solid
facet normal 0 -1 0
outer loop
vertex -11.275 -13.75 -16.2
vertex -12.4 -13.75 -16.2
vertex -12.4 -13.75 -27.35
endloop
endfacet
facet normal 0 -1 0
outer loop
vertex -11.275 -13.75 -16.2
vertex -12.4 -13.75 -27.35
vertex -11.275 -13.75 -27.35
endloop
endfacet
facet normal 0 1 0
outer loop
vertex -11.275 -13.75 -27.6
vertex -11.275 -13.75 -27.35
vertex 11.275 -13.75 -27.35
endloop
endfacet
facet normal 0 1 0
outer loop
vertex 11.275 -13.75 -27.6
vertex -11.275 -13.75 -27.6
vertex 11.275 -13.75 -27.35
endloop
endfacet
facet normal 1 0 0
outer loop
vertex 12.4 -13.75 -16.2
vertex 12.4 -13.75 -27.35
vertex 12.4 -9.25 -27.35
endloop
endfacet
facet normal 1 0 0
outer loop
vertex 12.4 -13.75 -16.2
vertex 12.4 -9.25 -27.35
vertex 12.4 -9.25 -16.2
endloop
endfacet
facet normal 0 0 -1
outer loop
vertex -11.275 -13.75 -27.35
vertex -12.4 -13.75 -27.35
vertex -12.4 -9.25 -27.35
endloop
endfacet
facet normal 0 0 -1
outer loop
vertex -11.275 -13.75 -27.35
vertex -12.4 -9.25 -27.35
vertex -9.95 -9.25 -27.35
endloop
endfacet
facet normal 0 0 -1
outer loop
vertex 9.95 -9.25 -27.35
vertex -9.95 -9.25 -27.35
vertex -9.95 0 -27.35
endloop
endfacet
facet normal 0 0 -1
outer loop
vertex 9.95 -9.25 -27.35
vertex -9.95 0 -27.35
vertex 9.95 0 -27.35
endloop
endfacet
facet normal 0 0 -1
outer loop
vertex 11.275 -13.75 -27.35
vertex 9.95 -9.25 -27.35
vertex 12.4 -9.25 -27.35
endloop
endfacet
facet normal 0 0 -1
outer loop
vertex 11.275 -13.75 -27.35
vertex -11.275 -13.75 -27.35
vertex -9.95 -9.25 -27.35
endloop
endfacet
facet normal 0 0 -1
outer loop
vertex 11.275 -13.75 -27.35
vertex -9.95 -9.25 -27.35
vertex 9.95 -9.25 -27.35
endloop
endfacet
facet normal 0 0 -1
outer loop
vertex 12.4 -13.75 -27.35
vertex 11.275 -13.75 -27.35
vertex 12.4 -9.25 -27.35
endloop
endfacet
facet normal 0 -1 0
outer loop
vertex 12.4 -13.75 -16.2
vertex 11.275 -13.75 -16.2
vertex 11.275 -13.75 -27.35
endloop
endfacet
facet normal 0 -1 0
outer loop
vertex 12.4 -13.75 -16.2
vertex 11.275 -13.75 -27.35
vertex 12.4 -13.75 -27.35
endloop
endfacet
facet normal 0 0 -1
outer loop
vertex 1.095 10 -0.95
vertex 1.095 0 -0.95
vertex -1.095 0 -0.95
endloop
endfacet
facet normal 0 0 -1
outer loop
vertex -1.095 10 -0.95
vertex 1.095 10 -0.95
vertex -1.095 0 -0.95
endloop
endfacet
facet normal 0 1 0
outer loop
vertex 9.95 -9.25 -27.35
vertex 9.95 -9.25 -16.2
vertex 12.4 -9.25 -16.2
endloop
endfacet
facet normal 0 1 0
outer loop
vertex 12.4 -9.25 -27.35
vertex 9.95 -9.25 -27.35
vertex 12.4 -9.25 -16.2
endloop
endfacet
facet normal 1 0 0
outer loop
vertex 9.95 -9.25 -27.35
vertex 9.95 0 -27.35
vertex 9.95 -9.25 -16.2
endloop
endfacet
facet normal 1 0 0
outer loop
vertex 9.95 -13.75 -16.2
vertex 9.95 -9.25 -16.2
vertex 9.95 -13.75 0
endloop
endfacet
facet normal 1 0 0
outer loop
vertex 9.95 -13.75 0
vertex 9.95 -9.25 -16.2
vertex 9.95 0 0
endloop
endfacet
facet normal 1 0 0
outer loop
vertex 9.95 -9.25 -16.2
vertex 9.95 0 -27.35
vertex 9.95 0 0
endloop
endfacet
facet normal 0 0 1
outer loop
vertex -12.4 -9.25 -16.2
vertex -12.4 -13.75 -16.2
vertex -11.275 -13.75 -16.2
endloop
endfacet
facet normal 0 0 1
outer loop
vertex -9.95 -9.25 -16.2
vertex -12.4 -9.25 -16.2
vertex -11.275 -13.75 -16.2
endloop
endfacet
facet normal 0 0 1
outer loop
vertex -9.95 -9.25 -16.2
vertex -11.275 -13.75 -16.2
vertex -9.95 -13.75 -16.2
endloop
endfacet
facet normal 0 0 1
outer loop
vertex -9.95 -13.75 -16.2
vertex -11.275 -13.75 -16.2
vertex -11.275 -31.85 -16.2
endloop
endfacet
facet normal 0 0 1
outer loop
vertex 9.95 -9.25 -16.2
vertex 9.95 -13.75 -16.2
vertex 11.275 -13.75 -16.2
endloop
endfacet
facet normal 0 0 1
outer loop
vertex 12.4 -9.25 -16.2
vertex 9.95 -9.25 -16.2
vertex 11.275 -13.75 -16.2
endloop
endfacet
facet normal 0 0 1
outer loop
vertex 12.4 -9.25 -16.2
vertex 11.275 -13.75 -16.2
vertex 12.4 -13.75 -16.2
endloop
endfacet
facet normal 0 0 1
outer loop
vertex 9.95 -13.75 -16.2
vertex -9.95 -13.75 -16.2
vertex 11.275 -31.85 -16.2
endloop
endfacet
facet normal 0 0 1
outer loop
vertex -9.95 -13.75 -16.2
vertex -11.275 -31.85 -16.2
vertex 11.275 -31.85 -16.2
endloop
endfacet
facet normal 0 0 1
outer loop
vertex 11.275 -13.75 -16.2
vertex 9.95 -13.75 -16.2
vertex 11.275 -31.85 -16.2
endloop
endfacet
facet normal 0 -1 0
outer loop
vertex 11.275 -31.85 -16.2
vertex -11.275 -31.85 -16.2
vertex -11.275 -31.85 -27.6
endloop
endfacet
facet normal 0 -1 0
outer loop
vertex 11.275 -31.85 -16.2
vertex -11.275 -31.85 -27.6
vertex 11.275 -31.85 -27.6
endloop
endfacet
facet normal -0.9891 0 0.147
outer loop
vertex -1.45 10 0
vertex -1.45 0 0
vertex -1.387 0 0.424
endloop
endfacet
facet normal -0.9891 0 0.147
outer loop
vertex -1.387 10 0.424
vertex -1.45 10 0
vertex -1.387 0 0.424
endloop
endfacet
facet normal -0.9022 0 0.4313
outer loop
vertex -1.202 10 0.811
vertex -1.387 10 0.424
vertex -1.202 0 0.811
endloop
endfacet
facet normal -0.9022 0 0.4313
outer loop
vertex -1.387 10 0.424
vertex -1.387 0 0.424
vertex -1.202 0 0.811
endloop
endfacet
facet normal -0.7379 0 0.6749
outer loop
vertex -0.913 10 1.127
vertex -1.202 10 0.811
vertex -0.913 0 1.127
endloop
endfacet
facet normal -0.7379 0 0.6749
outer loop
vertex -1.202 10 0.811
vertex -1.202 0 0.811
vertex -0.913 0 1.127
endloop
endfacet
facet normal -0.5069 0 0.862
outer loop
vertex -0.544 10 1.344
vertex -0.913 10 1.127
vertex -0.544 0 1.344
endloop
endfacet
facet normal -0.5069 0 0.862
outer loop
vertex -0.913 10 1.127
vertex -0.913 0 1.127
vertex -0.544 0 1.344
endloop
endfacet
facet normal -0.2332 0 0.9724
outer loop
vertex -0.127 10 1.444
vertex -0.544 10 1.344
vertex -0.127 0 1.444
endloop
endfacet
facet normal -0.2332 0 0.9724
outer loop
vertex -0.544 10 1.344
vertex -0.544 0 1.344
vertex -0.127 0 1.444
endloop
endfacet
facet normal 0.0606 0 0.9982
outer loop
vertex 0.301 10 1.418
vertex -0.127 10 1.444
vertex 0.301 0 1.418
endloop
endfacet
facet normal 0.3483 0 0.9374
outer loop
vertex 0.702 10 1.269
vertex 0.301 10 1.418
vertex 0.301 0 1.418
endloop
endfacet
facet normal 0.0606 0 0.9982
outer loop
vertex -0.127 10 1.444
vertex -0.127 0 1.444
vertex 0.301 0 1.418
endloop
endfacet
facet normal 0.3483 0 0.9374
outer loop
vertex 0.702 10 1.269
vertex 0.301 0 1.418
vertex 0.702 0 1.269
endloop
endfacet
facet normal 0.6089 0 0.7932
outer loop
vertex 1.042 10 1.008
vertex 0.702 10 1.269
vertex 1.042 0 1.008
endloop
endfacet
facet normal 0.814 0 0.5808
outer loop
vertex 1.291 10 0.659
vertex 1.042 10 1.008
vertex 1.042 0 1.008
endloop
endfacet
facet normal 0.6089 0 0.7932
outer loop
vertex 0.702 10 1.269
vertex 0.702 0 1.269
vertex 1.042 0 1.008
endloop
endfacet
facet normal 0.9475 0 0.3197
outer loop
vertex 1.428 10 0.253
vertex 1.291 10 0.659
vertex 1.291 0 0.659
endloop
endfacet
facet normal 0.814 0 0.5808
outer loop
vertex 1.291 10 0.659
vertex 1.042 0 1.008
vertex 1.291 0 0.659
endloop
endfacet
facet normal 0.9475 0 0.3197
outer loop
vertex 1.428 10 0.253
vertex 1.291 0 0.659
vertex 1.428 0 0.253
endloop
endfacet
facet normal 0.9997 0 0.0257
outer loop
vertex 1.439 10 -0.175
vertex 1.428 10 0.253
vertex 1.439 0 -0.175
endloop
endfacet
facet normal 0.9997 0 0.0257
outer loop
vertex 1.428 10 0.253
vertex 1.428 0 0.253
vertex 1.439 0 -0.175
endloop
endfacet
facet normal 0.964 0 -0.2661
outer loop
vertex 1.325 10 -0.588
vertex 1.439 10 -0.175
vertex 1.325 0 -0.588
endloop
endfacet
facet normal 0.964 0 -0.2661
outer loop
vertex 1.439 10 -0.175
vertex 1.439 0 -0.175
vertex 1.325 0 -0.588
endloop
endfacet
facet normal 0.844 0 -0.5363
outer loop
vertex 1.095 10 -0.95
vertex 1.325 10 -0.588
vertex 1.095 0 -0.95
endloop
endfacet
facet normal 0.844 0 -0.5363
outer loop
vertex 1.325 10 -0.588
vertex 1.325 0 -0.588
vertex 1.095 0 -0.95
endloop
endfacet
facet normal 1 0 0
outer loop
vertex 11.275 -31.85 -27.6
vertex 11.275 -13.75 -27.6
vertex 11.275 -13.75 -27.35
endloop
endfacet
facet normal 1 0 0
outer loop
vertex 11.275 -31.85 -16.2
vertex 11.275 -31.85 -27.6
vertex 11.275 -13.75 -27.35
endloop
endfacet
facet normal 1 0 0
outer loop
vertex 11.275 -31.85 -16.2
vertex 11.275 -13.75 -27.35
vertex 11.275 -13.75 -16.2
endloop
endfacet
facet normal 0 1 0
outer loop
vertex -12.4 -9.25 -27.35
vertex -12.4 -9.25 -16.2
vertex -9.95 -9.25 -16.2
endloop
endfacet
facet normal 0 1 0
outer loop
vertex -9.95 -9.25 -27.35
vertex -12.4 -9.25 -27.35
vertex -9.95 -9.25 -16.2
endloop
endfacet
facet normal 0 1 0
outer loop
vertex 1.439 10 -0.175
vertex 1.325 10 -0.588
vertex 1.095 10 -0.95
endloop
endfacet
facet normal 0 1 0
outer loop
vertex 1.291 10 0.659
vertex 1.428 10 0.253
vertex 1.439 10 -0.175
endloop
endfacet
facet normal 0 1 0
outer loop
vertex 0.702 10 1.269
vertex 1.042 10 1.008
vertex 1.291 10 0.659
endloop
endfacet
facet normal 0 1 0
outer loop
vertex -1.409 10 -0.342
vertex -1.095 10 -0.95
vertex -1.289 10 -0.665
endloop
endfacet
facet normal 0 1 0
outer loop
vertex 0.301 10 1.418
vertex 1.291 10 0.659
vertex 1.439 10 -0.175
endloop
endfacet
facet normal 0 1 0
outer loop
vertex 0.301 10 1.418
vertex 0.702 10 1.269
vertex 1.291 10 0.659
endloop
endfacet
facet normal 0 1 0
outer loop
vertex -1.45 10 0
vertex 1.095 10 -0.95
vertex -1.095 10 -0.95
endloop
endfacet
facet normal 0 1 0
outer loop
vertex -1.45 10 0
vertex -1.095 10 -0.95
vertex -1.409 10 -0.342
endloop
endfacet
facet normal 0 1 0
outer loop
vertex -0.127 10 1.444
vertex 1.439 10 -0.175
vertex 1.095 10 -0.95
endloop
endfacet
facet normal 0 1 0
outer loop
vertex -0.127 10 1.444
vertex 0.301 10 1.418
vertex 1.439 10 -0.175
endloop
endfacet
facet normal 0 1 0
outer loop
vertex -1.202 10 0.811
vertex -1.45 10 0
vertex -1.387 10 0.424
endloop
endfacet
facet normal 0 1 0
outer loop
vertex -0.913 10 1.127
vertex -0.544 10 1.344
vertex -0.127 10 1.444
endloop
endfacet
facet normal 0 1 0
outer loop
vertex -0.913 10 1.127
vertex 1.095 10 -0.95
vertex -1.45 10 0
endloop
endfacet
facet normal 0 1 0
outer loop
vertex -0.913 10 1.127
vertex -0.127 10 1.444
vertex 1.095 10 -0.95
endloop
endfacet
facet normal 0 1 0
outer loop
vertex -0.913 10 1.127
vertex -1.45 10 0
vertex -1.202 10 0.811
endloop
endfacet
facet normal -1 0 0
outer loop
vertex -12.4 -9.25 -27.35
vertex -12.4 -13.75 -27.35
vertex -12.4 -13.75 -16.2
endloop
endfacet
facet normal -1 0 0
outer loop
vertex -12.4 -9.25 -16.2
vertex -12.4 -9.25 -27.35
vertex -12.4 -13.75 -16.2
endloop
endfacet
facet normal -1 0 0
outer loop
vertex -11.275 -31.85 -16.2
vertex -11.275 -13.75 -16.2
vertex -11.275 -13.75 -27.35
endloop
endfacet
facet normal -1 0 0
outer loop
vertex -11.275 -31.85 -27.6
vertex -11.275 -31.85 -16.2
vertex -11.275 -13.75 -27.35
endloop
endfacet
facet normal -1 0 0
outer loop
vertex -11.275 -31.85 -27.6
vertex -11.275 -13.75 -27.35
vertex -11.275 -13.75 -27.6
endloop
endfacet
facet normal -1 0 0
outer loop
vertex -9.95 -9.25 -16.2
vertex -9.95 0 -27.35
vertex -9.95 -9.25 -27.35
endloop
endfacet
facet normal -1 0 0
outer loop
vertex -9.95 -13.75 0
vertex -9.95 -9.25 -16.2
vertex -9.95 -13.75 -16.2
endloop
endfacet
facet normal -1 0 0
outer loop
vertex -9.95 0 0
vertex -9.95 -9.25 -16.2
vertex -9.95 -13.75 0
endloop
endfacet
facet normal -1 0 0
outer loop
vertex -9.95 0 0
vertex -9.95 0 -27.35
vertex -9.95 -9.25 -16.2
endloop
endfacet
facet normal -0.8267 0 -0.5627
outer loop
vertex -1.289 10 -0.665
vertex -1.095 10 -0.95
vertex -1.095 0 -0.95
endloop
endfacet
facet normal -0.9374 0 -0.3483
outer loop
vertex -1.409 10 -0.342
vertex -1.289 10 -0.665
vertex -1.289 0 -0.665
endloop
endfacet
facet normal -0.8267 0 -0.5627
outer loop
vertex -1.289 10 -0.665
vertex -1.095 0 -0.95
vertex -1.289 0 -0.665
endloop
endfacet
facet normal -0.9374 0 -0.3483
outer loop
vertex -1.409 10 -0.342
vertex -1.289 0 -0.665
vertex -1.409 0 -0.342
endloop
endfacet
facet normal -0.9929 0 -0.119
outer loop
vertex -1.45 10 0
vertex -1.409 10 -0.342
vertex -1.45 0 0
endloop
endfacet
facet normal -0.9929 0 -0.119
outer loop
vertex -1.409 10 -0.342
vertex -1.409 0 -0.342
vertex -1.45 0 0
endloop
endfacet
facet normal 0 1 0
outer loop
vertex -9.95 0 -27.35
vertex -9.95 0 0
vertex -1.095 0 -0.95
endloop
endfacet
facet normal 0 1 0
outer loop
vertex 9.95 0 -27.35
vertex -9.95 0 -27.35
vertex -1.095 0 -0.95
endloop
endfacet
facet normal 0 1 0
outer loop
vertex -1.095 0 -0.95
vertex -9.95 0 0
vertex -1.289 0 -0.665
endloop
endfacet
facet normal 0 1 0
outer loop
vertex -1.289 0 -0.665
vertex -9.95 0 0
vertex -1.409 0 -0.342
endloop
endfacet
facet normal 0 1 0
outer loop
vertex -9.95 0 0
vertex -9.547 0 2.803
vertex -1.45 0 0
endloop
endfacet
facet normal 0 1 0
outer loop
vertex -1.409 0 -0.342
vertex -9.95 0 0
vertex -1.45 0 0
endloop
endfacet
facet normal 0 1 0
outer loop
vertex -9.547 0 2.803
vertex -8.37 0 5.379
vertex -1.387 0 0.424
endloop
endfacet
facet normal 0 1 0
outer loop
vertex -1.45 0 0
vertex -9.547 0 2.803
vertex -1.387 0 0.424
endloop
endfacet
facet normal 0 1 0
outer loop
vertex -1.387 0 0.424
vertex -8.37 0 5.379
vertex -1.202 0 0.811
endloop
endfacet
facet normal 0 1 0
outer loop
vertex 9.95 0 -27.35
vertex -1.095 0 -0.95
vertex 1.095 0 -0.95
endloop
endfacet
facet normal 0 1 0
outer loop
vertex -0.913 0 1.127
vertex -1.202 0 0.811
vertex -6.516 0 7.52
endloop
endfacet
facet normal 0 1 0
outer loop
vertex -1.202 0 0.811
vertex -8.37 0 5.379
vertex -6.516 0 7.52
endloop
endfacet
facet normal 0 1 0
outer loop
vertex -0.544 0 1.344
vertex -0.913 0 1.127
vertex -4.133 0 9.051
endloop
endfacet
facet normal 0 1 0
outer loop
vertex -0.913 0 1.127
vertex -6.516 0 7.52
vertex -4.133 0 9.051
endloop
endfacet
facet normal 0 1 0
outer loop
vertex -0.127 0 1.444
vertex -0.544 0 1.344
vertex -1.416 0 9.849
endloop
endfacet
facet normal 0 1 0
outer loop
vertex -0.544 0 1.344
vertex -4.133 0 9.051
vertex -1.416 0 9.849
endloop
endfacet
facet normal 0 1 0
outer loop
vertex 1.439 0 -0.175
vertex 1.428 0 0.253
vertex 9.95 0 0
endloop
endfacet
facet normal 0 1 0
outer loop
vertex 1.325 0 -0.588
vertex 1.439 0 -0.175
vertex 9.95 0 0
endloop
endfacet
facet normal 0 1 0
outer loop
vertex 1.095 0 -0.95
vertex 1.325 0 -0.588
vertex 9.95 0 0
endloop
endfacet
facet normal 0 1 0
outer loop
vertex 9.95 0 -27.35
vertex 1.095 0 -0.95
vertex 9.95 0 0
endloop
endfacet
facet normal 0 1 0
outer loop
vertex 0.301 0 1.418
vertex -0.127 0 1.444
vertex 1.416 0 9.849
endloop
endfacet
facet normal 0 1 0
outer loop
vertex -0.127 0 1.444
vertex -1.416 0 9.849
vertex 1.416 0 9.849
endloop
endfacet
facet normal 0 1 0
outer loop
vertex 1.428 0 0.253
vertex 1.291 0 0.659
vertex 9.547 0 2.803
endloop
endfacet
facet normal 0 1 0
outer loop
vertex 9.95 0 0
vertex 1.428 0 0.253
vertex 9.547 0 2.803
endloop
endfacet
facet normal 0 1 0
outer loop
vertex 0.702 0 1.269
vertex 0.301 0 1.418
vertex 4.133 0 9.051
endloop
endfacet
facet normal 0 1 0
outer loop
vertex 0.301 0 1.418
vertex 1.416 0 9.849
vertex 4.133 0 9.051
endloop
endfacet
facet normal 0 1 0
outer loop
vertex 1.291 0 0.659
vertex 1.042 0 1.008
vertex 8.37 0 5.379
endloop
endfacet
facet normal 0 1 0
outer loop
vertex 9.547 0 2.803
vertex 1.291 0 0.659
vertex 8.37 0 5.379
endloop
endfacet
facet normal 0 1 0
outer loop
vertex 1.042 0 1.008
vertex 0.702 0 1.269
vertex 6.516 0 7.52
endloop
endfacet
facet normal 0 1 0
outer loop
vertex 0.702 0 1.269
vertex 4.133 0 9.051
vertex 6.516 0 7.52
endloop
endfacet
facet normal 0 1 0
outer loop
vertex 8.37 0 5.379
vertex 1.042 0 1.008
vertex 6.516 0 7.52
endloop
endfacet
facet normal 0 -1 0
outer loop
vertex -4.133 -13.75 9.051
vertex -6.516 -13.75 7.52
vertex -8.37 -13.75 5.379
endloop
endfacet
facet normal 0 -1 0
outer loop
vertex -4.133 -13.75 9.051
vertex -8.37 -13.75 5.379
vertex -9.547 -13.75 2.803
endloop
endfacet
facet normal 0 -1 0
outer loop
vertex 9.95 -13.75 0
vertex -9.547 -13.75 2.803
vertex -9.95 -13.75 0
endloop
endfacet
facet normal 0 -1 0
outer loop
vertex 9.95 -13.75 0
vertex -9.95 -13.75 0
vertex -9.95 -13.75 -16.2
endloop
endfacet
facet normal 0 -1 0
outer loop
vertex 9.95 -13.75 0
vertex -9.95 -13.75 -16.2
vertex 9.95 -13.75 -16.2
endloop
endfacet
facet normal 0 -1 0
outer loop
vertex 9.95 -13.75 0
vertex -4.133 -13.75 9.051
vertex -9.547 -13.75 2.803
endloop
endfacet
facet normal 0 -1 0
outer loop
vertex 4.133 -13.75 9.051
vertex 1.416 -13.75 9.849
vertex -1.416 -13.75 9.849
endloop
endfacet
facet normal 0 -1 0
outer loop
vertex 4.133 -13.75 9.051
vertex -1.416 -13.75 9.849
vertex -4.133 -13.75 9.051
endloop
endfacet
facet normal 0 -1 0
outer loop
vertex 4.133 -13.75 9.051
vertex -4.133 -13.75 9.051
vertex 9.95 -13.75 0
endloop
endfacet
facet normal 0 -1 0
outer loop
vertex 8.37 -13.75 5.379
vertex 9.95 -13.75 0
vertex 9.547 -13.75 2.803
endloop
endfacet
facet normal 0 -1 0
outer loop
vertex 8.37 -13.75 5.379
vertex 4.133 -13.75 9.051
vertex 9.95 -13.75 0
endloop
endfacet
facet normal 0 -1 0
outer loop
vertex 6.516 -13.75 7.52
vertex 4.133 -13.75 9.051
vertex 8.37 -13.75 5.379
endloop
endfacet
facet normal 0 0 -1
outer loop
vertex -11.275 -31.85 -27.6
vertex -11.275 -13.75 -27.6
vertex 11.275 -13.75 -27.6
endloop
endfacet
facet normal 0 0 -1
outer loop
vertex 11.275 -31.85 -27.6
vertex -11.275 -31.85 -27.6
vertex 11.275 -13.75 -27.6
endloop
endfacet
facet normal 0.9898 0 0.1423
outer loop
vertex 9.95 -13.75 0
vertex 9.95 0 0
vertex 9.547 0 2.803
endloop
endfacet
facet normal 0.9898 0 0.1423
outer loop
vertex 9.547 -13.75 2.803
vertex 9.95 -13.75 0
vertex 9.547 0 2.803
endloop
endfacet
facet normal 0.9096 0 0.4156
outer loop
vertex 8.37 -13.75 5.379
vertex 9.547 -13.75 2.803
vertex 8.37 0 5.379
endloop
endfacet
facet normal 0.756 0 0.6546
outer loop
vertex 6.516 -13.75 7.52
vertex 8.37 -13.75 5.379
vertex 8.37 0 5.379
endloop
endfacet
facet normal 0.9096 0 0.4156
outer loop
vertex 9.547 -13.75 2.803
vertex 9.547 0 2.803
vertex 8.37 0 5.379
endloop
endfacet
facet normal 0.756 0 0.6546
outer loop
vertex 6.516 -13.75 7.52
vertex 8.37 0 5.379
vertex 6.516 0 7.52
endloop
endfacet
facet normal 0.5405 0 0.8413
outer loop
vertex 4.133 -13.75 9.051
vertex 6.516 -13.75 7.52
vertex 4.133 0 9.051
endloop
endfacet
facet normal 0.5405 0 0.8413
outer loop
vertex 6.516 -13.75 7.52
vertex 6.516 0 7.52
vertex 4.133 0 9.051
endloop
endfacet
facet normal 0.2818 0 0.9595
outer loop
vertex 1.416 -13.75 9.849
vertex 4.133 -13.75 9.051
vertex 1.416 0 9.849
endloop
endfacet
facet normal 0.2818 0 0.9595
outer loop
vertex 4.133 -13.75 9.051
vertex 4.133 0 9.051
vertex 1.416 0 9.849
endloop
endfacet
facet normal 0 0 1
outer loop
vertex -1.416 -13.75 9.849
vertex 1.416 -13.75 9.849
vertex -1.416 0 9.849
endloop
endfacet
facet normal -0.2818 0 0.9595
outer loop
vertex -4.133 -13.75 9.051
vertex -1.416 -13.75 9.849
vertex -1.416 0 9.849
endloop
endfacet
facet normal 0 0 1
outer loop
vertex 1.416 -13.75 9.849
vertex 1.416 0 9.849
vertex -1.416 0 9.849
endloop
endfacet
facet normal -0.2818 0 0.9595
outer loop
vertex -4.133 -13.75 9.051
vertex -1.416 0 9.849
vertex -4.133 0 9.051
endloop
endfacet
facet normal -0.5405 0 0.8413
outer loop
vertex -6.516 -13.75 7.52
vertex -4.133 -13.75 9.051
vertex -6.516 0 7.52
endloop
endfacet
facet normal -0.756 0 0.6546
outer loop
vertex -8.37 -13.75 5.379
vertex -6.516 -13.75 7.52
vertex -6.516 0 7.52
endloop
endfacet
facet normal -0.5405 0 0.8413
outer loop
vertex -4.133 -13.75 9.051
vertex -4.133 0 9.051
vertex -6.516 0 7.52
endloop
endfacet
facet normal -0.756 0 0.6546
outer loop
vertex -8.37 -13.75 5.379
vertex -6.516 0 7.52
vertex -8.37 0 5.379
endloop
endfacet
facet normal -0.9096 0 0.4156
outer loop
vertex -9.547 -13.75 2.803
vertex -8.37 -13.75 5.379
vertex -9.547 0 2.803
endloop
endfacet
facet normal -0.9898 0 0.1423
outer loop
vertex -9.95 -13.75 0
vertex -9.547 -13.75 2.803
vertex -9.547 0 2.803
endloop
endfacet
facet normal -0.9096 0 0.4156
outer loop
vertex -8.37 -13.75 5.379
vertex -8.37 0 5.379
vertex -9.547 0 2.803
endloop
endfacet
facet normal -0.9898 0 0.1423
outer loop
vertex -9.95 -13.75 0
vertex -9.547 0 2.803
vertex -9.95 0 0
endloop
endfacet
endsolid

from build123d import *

# Parameters (mm, degrees)
F0_W     = 19.9
F0_H     = 27.35
F1_DEPTH = 13.75
F2_W     = 19.9
F2_H     = 11.15
F3_DEPTH = 18.1
F4_W     = 24.8
F4_H     = 11.15
F5_DEPTH = 4.5
F7_DEPTH = 10


with BuildPart() as f1:
    # F0 (on Front) → F1 (new body)
    with BuildSketch(Plane.XZ):
        with BuildLine():
            ThreePointArc((9.95, 0), (0, 9.95), (-9.95, 0))
            Line((-9.95, 0), (9.95, 0))
        make_face()
        with Locations((0, -13.675)):
            Rectangle(F0_W, F0_H)
    extrude(amount=F1_DEPTH)

    # F2 (on face) → F3 (join)
    with BuildSketch(Plane.XZ.offset(13.75)):
        Polygon((-11.275, -16.2), (-11.275, -27.6), (11.275, -27.6), (11.275, -16.2), (9.95, -16.2), (9.95, -27.35), (-9.95, -27.35), (-9.95, -16.2), align=None)
        with Locations((0, -21.775)):
            Rectangle(F2_W, F2_H)
    extrude(amount=F3_DEPTH)

    # F4 (on face) → F5 (join)
    with BuildSketch(Plane.XZ.offset(13.75)):
        with Locations((0, -21.775)):
            Rectangle(F4_W, F4_H)
    extrude(amount=-F5_DEPTH)

    # F6 (on face) → F7 (join)
    with BuildSketch(Plane(origin=(0, 0, 0), x_dir=(-1, 0, 0), z_dir=(0, 1, 0))):
        with BuildLine():
            ThreePointArc((1.095445, -0.95), (1.358473, -0.507003), (1.45, 0))
            ThreePointArc((1.45, 0), (-0.507003, 1.358473), (-1.095445, -0.95))
            Line((-1.095445, -0.95), (1.095445, -0.95))
        make_face()
    extrude(amount=F7_DEPTH)


solid = f1.part
